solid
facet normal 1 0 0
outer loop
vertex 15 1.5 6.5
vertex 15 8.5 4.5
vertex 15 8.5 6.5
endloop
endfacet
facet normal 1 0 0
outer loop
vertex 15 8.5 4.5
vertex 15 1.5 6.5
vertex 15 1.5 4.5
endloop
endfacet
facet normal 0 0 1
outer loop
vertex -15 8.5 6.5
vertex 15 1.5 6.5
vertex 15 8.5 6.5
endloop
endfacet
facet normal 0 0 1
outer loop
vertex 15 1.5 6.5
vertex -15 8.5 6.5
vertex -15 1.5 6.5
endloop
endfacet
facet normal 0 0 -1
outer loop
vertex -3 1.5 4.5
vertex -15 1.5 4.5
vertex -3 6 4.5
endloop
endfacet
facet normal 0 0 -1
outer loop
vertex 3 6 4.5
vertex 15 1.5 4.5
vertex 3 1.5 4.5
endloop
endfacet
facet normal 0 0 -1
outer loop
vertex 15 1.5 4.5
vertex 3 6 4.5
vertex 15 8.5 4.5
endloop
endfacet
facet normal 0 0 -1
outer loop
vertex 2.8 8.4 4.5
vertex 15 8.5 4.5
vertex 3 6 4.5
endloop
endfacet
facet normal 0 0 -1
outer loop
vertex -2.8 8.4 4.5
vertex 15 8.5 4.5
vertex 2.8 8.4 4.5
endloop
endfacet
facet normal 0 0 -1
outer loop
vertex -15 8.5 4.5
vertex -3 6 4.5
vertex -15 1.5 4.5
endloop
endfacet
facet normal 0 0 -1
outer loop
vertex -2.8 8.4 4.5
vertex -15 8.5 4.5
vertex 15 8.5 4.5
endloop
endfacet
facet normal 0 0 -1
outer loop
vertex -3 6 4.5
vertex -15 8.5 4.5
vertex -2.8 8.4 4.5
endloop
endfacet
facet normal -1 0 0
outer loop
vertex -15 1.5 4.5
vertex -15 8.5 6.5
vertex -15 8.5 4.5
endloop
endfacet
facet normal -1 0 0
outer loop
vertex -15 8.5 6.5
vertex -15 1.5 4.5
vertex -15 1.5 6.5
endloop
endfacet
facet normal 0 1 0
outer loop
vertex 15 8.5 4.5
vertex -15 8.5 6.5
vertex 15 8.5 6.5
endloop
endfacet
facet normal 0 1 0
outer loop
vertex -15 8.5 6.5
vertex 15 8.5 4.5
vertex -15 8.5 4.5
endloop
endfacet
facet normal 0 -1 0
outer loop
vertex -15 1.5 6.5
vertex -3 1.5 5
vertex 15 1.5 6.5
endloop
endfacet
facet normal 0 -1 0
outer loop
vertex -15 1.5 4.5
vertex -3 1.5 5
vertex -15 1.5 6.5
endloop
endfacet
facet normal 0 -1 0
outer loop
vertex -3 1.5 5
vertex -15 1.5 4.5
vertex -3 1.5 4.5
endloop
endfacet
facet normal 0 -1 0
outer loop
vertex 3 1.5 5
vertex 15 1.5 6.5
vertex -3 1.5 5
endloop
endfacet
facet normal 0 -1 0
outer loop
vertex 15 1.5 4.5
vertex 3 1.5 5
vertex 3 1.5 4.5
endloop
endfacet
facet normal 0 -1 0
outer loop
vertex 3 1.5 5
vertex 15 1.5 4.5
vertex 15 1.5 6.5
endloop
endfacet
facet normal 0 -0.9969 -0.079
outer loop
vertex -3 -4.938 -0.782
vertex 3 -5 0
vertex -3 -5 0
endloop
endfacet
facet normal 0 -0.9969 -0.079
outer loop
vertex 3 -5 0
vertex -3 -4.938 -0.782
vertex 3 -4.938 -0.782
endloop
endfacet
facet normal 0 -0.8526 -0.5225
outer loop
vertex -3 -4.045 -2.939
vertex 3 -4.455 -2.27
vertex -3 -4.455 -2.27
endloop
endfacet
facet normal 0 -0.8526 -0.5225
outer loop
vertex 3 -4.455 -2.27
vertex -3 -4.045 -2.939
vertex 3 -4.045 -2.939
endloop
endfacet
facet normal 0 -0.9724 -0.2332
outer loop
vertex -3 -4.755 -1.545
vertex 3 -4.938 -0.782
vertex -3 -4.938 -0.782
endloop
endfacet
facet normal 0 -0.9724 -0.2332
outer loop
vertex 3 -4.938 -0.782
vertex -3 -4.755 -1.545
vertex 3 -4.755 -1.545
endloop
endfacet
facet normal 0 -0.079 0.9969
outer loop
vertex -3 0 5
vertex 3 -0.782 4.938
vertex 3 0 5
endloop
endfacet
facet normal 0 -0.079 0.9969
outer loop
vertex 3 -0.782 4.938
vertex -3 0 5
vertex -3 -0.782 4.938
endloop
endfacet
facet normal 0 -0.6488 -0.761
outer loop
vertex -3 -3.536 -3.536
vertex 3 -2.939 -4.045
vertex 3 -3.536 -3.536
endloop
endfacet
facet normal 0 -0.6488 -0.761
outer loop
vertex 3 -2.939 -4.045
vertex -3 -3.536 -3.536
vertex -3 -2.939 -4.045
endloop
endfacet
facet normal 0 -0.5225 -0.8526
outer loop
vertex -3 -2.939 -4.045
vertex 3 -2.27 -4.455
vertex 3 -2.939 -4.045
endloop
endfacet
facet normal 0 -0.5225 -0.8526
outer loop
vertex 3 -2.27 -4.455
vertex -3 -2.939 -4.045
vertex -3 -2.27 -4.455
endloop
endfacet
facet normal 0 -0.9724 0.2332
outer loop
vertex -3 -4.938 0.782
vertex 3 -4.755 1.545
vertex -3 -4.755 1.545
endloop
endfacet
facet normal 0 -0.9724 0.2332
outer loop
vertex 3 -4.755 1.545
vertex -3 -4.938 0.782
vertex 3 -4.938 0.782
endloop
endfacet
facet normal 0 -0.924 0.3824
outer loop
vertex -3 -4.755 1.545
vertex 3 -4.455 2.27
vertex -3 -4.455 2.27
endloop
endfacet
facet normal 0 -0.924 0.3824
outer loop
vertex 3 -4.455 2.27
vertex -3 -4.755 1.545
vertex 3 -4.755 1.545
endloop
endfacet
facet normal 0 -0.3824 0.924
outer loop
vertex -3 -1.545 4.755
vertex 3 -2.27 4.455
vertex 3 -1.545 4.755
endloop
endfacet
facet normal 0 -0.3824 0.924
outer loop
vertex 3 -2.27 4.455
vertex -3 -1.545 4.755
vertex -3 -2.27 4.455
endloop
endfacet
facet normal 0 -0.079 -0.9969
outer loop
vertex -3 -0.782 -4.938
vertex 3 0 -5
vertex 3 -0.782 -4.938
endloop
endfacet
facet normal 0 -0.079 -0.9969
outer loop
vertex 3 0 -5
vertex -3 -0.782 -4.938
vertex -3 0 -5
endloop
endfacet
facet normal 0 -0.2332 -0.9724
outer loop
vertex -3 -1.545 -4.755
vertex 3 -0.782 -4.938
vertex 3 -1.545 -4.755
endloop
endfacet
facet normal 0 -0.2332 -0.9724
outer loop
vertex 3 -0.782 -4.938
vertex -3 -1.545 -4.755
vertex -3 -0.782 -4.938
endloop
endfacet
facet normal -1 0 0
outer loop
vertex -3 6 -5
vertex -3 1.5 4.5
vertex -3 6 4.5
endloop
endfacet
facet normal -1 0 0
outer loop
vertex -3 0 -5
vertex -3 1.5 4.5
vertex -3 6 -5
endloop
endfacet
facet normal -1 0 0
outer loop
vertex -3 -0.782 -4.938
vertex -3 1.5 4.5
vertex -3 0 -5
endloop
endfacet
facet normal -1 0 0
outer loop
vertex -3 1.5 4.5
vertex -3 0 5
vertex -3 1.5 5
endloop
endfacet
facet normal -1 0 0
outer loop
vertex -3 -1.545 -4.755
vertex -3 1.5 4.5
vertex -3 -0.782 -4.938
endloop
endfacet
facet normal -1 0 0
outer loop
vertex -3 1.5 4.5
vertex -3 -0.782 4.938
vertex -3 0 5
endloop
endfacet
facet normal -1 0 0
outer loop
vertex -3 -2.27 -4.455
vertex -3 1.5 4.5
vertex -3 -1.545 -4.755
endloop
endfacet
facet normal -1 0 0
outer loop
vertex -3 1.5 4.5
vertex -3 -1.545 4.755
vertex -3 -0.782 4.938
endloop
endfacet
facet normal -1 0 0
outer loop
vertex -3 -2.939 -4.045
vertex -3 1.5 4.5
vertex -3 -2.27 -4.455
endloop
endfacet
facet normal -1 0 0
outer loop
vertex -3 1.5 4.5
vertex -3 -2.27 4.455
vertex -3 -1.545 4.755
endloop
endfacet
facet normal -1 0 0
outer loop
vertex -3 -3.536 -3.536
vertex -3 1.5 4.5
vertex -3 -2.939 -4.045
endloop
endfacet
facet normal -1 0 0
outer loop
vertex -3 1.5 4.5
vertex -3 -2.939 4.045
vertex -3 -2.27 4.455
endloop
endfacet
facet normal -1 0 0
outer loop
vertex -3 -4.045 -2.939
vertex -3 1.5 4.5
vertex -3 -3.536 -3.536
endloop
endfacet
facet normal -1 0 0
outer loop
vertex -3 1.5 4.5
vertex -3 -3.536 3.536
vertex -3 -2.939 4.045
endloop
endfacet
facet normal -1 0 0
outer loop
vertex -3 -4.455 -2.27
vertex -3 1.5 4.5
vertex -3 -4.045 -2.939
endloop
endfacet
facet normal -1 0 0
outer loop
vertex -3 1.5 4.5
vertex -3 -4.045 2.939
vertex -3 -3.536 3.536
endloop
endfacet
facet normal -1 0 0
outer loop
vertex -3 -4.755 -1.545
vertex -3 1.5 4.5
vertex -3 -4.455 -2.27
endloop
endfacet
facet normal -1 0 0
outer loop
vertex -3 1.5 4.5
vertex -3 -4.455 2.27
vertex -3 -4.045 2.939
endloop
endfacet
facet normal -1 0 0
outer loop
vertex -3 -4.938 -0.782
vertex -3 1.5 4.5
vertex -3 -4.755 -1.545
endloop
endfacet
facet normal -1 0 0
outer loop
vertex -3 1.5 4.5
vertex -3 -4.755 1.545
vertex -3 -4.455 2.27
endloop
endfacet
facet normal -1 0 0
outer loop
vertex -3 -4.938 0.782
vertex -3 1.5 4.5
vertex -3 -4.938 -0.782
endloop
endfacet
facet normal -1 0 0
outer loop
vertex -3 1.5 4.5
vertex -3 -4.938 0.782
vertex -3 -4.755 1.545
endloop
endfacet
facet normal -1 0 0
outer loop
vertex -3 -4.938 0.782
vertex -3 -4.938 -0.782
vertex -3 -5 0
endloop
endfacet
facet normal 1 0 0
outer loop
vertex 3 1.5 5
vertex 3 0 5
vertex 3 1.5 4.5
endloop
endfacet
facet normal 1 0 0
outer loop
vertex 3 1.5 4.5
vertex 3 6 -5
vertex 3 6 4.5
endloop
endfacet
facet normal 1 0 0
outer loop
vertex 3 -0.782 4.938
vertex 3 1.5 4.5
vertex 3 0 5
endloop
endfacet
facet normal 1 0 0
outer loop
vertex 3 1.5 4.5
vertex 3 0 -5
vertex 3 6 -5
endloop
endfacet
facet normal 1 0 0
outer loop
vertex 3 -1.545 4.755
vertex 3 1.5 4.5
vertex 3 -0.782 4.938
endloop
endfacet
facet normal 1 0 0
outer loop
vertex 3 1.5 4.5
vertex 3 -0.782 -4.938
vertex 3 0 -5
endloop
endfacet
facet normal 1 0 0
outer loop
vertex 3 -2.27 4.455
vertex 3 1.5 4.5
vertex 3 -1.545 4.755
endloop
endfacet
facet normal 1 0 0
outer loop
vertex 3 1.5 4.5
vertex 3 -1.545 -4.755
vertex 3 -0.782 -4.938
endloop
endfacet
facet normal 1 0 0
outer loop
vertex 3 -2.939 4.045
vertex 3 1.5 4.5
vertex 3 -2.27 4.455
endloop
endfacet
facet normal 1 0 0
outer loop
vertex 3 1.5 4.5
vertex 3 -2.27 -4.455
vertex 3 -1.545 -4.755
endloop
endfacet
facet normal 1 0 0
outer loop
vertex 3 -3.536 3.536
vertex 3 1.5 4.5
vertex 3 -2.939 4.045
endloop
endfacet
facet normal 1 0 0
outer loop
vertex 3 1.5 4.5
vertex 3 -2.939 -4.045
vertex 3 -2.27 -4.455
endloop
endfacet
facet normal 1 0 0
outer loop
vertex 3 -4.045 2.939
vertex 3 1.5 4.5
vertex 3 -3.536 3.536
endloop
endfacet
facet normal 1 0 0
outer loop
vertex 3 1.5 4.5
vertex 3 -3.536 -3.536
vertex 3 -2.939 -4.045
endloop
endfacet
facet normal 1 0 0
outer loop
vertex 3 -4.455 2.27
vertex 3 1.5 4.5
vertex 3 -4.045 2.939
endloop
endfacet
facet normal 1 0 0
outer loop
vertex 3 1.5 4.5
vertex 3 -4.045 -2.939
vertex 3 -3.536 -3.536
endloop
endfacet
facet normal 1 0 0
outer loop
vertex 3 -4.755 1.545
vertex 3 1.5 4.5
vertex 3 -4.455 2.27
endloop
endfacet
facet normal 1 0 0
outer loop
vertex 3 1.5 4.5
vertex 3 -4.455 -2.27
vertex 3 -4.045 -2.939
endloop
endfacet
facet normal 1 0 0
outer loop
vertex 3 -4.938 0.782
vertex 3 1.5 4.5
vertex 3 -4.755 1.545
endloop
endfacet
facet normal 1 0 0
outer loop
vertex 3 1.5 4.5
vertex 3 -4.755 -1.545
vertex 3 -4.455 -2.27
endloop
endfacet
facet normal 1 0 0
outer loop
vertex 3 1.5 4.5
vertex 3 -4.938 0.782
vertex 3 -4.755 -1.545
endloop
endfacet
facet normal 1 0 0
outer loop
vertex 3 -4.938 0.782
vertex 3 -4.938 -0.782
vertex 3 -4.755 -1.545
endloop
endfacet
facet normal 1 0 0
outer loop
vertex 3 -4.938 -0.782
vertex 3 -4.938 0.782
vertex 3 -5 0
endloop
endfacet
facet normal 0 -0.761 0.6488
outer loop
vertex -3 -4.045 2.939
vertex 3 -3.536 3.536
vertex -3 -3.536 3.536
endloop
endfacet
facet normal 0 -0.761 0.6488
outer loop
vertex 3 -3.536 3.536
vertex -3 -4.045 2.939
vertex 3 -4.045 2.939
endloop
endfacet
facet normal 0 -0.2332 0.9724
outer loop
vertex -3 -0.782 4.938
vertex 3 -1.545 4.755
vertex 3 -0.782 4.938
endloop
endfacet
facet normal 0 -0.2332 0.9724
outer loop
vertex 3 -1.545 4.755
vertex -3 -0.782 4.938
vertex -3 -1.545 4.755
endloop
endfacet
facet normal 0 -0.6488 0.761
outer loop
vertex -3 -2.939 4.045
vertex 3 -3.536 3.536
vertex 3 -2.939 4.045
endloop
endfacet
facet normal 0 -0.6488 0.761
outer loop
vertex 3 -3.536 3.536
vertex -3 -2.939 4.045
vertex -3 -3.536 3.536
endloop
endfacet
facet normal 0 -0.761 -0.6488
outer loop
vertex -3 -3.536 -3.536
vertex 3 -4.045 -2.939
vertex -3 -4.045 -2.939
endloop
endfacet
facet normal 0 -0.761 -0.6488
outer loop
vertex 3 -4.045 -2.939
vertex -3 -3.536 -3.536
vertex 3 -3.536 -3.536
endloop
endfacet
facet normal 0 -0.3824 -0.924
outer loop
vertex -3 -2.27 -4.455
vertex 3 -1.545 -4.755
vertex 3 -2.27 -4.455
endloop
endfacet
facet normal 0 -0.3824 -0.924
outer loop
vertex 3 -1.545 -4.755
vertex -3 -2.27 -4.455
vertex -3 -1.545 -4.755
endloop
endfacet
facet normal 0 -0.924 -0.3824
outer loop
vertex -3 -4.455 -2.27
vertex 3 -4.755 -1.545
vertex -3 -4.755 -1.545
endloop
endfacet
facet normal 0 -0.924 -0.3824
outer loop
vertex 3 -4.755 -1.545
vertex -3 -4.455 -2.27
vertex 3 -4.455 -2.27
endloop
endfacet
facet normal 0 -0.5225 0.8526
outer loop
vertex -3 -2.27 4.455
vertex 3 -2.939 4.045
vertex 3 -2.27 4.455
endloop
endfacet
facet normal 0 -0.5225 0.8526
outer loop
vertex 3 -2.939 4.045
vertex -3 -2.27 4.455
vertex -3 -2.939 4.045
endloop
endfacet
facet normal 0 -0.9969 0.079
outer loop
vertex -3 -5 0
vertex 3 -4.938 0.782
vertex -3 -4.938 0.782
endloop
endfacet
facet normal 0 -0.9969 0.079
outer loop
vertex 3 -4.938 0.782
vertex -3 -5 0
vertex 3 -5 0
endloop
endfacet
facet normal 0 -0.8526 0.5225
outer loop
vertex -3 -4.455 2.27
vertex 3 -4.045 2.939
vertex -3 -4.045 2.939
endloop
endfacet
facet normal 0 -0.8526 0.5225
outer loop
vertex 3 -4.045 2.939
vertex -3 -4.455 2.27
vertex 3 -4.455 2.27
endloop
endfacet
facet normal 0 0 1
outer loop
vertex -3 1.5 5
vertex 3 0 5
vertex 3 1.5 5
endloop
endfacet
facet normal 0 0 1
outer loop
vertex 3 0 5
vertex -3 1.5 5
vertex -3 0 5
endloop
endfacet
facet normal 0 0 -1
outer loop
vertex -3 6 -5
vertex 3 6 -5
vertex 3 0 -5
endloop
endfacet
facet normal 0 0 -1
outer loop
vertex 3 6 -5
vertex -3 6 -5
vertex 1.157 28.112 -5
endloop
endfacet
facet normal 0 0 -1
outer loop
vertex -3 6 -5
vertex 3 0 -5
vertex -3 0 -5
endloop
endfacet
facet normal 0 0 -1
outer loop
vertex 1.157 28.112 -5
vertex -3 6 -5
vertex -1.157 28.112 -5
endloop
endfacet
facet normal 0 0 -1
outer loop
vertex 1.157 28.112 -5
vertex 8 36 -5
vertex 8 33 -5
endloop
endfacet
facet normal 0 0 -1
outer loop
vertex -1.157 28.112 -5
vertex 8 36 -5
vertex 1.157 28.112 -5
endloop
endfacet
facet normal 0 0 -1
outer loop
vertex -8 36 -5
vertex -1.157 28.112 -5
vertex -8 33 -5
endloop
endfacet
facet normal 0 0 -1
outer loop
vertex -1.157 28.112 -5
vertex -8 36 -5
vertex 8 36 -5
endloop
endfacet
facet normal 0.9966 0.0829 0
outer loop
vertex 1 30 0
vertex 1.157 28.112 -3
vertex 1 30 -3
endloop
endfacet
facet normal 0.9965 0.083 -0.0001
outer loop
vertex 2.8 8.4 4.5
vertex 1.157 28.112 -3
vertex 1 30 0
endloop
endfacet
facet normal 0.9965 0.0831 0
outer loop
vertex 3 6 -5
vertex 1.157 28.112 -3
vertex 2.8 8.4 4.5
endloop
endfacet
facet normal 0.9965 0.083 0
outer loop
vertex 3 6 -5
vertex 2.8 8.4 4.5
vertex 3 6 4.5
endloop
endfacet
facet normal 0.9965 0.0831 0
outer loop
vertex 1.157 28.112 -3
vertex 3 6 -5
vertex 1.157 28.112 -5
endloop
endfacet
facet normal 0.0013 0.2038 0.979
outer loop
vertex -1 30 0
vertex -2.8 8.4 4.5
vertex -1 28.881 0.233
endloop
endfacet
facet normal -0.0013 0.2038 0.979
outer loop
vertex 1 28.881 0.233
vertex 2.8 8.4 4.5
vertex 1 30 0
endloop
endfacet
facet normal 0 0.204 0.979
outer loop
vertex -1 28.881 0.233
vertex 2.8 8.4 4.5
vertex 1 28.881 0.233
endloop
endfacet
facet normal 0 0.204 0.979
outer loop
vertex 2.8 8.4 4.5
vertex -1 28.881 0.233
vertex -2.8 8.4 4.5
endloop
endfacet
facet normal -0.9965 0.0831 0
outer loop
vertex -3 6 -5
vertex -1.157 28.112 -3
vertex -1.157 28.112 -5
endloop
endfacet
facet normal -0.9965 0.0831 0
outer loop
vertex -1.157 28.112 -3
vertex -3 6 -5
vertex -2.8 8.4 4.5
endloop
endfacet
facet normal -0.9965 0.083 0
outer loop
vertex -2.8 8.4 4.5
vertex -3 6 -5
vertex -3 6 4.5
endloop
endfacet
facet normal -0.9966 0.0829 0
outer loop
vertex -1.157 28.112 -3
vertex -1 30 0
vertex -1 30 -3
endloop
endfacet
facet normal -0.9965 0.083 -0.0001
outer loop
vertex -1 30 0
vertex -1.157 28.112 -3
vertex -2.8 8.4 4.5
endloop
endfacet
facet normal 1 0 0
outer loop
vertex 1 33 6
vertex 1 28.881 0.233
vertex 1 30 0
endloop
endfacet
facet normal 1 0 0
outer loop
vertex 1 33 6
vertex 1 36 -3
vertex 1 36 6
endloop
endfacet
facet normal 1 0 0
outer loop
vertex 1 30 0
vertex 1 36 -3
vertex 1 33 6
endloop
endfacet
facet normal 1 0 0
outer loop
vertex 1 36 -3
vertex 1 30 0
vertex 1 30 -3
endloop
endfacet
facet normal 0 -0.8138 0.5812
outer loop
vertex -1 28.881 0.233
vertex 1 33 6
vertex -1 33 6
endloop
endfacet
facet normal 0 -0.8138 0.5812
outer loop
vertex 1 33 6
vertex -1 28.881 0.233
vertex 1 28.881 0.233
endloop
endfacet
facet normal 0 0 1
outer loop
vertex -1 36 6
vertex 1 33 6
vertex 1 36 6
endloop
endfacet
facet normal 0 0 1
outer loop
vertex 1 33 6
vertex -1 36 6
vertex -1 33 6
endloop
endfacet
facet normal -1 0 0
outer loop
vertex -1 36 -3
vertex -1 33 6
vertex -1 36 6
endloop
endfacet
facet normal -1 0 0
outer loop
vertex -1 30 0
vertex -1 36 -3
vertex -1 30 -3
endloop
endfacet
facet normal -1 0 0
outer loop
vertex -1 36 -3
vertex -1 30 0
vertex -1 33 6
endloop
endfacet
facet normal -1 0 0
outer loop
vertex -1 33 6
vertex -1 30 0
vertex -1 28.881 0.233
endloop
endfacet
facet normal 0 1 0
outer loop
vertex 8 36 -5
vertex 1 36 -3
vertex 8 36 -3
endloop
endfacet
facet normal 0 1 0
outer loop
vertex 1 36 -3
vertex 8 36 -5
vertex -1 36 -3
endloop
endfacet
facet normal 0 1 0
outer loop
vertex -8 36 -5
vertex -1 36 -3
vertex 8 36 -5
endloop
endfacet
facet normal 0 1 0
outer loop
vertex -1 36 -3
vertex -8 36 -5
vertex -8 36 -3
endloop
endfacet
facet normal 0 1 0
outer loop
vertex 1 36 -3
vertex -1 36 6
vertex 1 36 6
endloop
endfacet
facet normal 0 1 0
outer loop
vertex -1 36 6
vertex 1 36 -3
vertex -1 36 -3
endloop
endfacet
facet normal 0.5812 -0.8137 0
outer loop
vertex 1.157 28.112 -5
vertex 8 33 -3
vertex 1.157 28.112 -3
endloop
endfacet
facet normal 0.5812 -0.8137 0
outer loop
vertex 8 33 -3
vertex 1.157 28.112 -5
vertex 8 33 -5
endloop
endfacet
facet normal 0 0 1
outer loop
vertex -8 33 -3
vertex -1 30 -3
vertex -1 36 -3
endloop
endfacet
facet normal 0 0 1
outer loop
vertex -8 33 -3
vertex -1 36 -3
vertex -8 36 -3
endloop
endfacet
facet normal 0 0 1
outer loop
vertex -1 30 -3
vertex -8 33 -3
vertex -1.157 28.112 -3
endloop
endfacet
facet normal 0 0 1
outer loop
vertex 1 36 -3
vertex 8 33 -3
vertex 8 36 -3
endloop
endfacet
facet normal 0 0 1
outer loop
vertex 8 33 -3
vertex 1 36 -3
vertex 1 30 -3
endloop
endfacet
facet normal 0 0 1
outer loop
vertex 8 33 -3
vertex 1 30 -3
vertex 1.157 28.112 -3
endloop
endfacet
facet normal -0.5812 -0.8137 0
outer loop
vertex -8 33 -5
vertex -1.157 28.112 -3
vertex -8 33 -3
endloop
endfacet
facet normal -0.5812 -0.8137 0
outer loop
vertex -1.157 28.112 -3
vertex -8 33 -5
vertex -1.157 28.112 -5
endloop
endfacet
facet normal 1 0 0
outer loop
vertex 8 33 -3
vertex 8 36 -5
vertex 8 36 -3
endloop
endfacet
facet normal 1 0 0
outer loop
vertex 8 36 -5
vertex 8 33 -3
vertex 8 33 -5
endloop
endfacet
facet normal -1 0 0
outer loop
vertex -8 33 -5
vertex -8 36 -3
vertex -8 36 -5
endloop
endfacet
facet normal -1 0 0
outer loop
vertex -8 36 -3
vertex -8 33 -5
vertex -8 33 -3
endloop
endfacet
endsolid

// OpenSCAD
wingX = 30;
wingY = 7;
wingZ = 2;

translate([0,5,5.5]) cube([wingX, wingY, wingZ], true);

$fn=40;
rotate([0,90,0]) cylinder(r=5, h=6, center=true);

BodyPoints = [
  [  -3,  6,  -5 ],  //0
  [ 3,  6,  -5 ],  //1
  [ 1,  30,  -5 ],  //2
  [  -1,  30,  -5 ],  //3
  [  -3,  6,  5 ],  //4
  [ 3,  6,  5 ],  //5
  [ 1,  30,  0 ],  //6
  [  -1,  30,  0 ]]; //7
  
BodyFaces = [
  [0,1,2,3],  // bottom
  [4,5,1,0],  // front
  [7,6,5,4],  // top
  [5,6,2,1],  // right
  [6,7,3,2],  // back
  [7,4,0,3]]; // left
  
  
translate([-3, 0, -5]) cube([6, 6, 10]);
polyhedron(BodyPoints, BodyFaces);
polyhedron(VertPoints, BodyFaces);
polyhedron(HorizPoints, BodyFaces);
translate([-8, 33, -5]) cube([16,3,2]);
translate([-1,30,-5]) cube([2,6,4]);

HorizPoints = [
  [  -1,  28,  -5 ],  //0
  [ 1,  28,  -5 ],  //1
  [ 8,  33,  -5 ],  //2
  [  -8,  33,  -5 ],  //3
  [  -1,  28,  -3 ],  //4
  [ 1,  28,  -3 ],  //5
  [ 8,  33,  -3],  //6
  [  -8,  33,  -3 ]]; //7
  
VertPoints = [
  [  -1,  28,  -1 ],  //0
  [ 1,  28,  -1 ],  //1
  [ 1,  36,  -1 ],  //2
  [  -1,  36,  -1 ],  //3
  [  -1,  33,  6 ],  //4
  [ 1,  33,  6 ],  //5
  [ 1,  36,  6 ],  //6
  [  -1,  36,  6 ]]; //7
